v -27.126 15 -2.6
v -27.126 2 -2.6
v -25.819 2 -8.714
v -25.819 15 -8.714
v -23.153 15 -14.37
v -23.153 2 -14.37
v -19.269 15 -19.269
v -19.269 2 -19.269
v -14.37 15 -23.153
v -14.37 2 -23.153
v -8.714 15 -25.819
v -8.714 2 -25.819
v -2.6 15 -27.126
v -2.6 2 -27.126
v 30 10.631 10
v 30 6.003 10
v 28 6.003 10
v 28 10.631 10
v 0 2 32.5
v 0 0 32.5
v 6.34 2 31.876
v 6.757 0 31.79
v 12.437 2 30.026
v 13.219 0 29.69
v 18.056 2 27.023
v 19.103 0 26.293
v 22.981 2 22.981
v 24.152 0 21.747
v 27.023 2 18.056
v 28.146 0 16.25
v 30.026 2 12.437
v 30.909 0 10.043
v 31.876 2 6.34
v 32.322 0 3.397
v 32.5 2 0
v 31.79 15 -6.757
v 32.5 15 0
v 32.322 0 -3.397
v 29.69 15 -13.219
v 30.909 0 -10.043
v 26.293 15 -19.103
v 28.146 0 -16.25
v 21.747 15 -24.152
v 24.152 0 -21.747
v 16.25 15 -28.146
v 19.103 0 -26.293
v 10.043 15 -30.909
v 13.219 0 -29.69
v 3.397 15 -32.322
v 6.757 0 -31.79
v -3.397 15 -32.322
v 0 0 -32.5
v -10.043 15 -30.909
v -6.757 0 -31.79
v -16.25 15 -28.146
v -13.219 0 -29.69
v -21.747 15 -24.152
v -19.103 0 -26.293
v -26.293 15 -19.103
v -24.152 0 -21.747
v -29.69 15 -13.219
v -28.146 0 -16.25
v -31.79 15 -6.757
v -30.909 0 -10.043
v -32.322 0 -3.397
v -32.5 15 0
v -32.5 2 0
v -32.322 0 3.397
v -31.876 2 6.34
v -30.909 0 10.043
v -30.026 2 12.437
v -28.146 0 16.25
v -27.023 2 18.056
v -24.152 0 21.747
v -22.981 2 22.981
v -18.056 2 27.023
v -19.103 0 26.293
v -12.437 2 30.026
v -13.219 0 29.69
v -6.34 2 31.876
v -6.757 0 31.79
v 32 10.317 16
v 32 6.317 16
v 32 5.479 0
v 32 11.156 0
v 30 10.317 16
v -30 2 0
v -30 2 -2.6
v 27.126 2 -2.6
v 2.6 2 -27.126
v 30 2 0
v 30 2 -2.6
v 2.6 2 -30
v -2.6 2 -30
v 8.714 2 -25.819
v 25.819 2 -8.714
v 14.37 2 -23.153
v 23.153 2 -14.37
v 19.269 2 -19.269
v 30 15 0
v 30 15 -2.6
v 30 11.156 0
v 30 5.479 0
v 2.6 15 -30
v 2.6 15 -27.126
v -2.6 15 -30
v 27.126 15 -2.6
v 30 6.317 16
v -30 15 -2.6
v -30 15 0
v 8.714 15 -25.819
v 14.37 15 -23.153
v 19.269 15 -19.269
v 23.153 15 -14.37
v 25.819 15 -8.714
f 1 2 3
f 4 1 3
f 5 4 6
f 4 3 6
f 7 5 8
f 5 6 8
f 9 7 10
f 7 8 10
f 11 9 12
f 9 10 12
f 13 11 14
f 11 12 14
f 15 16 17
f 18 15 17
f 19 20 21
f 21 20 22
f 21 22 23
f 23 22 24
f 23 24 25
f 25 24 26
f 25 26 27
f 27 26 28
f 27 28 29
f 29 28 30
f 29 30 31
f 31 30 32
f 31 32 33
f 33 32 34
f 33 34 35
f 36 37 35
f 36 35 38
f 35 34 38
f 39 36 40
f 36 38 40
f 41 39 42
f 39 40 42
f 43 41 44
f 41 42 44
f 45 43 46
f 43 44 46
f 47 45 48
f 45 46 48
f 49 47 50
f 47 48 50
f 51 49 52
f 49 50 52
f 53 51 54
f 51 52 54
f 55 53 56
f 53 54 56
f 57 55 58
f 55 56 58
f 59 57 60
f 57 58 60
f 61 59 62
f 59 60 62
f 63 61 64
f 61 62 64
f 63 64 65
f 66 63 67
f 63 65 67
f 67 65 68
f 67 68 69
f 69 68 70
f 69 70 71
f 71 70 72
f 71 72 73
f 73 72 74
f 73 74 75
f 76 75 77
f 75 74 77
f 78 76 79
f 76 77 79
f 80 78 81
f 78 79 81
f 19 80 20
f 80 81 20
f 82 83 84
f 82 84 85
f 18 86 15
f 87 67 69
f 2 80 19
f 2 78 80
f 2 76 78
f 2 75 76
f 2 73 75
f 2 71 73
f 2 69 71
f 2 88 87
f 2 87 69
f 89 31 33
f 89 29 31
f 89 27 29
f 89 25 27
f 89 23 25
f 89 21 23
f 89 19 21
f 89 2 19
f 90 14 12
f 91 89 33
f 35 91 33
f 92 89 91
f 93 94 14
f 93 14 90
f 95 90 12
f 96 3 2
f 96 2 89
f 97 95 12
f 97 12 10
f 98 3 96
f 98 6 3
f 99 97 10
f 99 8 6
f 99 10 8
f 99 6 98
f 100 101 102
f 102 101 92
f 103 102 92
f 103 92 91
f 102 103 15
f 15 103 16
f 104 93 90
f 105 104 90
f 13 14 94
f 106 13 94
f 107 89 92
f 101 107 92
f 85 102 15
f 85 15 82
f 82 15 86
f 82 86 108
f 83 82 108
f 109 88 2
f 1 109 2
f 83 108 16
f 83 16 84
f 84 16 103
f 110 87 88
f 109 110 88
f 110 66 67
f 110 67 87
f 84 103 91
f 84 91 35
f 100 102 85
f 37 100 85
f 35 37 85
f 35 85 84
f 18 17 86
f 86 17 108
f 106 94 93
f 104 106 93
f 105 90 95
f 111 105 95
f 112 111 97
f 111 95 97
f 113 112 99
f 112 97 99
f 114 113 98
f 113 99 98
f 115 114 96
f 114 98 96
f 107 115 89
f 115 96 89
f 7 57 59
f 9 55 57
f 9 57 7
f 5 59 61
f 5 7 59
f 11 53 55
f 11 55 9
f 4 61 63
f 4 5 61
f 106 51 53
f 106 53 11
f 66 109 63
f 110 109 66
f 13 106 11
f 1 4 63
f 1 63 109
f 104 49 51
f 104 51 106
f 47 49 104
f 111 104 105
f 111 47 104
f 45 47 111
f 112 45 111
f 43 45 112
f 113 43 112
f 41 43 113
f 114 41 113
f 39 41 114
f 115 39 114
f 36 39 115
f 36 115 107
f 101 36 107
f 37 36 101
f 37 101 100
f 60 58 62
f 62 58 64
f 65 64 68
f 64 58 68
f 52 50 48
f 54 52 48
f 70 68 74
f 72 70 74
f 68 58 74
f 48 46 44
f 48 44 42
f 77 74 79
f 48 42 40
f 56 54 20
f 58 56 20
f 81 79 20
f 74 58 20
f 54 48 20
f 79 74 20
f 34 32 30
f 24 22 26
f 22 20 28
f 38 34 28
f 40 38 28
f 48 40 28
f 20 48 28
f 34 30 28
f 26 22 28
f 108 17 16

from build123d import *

# Parameters (mm, degrees)
SKETCH1_R           = 32.5
BOSS_EXTRUDE1_DEPTH = 2
SKETCH2_R           = 32.5
BOSS_EXTRUDE2_DEPTH = 13
SKETCH6_W           = 71.390071862
SKETCH6_H           = 35.774890597
CUT_EXTRUDE4_DEPTH  = 13
SNAP_START          = 30
SNAP_HOOK1_DEPTH    = 2
SNAP_START_2        = 6.002601726
SNAP_HOOK1_2_DEPTH  = 4.628893351
SNAP_START_3        = 27
SNAP_HOOK1_3_DEPTH  = 3


with BuildPart() as part:
    # Sketch1 → Boss-Extrude1 (new body)
    with BuildSketch(Plane(origin=(0, 0, 0), x_dir=(1, 0, 0), z_dir=(0, 1, 0))):
        with Locations(Location((0, 0, 0), (0, 0, 270))):
            Circle(SKETCH1_R)
    extrude(amount=BOSS_EXTRUDE1_DEPTH)

    # Sketch2 → Boss-Extrude2 (add)
    with BuildSketch(Plane(origin=(0, 2, 0), x_dir=(1, 0, 0), z_dir=(0, 1, 0))):
        with Locations(Location((0, 0, 0), (0, 0, 270))):
            Circle(SKETCH2_R)
        with BuildLine():
            Line((2.6, -27.125679715), (2.6, -30))
            Line((2.6, -30), (-2.6, -30))
            Line((-2.6, -30), (-2.6, -27.125679715))
            ThreePointArc((-2.6, -27.125679715), (-19.268659787, -19.268659787), (-27.125679715, -2.6))
            Line((-27.125679715, -2.6), (-30, -2.6))
            Line((-30, -2.6), (-30, 2.6))
            Line((-30, 2.6), (-27.125679715, 2.6))
            ThreePointArc((-27.125679715, 2.6), (-19.268659787, 19.268659787), (-2.6, 27.125679715))
            Line((-2.6, 27.125679715), (-2.6, 30))
            Line((-2.6, 30), (2.6, 30))
            Line((2.6, 30), (2.6, 27.125679715))
            ThreePointArc((2.6, 27.125679715), (19.268659787, 19.268659787), (27.125679715, 2.6))
            Line((27.125679715, 2.6), (30, 2.6))
            Line((30, 2.6), (30, -2.6))
            Line((30, -2.6), (27.125679715, -2.6))
            ThreePointArc((27.125679715, -2.6), (19.268659787, -19.268659787), (2.6, -27.125679715))
        make_face(mode=Mode.SUBTRACT)
    extrude(amount=BOSS_EXTRUDE2_DEPTH)

    # Sketch6 → Cut-Extrude4 (cut)
    with BuildSketch(Plane(origin=(0, 15, 0), x_dir=(1, 0, 0), z_dir=(0, 1, 0))):
        with Locations((0.159709333, -17.887445299)):
            Rectangle(SKETCH6_W, SKETCH6_H)
    extrude(amount=-CUT_EXTRUDE4_DEPTH, mode=Mode.SUBTRACT)

    # Snap Hook1: read off the stored shape, not the designer's step
    # Snap Hook1 outline → Snap Hook1 (add)
    with BuildSketch(Plane.YZ.offset(SNAP_START)):
        Polygon((6.317048401, 16), (5.478523933, 0), (11.15557287, 0), (10.317048401, 16), align=None)
    extrude(amount=SNAP_HOOK1_DEPTH)

    # Snap Hook1 2 outline → Snap Hook1 2 (add)
    with BuildSketch(Plane(origin=(0, 0, 0), x_dir=(1, 0, 0), z_dir=(0, 1, 0)).offset(SNAP_START_2)):
        Polygon((30, -16), (30, -10), (28, -10), align=None)
    extrude(amount=SNAP_HOOK1_2_DEPTH)

    # Snap Hook1 3 outline → Snap Hook1 3 (cut)
    with BuildSketch(Plane.YZ.offset(SNAP_START_3)):
        Polygon((6.002601726, 10), (6.317048401, 16), (6.36945618, 17), (6.002601726, 17), align=None)
        Polygon((10.631495077, 17), (10.264640622, 17), (10.317048401, 16), (10.631495077, 10), align=None)
    extrude(amount=SNAP_HOOK1_3_DEPTH, mode=Mode.SUBTRACT)


solid = part.part
